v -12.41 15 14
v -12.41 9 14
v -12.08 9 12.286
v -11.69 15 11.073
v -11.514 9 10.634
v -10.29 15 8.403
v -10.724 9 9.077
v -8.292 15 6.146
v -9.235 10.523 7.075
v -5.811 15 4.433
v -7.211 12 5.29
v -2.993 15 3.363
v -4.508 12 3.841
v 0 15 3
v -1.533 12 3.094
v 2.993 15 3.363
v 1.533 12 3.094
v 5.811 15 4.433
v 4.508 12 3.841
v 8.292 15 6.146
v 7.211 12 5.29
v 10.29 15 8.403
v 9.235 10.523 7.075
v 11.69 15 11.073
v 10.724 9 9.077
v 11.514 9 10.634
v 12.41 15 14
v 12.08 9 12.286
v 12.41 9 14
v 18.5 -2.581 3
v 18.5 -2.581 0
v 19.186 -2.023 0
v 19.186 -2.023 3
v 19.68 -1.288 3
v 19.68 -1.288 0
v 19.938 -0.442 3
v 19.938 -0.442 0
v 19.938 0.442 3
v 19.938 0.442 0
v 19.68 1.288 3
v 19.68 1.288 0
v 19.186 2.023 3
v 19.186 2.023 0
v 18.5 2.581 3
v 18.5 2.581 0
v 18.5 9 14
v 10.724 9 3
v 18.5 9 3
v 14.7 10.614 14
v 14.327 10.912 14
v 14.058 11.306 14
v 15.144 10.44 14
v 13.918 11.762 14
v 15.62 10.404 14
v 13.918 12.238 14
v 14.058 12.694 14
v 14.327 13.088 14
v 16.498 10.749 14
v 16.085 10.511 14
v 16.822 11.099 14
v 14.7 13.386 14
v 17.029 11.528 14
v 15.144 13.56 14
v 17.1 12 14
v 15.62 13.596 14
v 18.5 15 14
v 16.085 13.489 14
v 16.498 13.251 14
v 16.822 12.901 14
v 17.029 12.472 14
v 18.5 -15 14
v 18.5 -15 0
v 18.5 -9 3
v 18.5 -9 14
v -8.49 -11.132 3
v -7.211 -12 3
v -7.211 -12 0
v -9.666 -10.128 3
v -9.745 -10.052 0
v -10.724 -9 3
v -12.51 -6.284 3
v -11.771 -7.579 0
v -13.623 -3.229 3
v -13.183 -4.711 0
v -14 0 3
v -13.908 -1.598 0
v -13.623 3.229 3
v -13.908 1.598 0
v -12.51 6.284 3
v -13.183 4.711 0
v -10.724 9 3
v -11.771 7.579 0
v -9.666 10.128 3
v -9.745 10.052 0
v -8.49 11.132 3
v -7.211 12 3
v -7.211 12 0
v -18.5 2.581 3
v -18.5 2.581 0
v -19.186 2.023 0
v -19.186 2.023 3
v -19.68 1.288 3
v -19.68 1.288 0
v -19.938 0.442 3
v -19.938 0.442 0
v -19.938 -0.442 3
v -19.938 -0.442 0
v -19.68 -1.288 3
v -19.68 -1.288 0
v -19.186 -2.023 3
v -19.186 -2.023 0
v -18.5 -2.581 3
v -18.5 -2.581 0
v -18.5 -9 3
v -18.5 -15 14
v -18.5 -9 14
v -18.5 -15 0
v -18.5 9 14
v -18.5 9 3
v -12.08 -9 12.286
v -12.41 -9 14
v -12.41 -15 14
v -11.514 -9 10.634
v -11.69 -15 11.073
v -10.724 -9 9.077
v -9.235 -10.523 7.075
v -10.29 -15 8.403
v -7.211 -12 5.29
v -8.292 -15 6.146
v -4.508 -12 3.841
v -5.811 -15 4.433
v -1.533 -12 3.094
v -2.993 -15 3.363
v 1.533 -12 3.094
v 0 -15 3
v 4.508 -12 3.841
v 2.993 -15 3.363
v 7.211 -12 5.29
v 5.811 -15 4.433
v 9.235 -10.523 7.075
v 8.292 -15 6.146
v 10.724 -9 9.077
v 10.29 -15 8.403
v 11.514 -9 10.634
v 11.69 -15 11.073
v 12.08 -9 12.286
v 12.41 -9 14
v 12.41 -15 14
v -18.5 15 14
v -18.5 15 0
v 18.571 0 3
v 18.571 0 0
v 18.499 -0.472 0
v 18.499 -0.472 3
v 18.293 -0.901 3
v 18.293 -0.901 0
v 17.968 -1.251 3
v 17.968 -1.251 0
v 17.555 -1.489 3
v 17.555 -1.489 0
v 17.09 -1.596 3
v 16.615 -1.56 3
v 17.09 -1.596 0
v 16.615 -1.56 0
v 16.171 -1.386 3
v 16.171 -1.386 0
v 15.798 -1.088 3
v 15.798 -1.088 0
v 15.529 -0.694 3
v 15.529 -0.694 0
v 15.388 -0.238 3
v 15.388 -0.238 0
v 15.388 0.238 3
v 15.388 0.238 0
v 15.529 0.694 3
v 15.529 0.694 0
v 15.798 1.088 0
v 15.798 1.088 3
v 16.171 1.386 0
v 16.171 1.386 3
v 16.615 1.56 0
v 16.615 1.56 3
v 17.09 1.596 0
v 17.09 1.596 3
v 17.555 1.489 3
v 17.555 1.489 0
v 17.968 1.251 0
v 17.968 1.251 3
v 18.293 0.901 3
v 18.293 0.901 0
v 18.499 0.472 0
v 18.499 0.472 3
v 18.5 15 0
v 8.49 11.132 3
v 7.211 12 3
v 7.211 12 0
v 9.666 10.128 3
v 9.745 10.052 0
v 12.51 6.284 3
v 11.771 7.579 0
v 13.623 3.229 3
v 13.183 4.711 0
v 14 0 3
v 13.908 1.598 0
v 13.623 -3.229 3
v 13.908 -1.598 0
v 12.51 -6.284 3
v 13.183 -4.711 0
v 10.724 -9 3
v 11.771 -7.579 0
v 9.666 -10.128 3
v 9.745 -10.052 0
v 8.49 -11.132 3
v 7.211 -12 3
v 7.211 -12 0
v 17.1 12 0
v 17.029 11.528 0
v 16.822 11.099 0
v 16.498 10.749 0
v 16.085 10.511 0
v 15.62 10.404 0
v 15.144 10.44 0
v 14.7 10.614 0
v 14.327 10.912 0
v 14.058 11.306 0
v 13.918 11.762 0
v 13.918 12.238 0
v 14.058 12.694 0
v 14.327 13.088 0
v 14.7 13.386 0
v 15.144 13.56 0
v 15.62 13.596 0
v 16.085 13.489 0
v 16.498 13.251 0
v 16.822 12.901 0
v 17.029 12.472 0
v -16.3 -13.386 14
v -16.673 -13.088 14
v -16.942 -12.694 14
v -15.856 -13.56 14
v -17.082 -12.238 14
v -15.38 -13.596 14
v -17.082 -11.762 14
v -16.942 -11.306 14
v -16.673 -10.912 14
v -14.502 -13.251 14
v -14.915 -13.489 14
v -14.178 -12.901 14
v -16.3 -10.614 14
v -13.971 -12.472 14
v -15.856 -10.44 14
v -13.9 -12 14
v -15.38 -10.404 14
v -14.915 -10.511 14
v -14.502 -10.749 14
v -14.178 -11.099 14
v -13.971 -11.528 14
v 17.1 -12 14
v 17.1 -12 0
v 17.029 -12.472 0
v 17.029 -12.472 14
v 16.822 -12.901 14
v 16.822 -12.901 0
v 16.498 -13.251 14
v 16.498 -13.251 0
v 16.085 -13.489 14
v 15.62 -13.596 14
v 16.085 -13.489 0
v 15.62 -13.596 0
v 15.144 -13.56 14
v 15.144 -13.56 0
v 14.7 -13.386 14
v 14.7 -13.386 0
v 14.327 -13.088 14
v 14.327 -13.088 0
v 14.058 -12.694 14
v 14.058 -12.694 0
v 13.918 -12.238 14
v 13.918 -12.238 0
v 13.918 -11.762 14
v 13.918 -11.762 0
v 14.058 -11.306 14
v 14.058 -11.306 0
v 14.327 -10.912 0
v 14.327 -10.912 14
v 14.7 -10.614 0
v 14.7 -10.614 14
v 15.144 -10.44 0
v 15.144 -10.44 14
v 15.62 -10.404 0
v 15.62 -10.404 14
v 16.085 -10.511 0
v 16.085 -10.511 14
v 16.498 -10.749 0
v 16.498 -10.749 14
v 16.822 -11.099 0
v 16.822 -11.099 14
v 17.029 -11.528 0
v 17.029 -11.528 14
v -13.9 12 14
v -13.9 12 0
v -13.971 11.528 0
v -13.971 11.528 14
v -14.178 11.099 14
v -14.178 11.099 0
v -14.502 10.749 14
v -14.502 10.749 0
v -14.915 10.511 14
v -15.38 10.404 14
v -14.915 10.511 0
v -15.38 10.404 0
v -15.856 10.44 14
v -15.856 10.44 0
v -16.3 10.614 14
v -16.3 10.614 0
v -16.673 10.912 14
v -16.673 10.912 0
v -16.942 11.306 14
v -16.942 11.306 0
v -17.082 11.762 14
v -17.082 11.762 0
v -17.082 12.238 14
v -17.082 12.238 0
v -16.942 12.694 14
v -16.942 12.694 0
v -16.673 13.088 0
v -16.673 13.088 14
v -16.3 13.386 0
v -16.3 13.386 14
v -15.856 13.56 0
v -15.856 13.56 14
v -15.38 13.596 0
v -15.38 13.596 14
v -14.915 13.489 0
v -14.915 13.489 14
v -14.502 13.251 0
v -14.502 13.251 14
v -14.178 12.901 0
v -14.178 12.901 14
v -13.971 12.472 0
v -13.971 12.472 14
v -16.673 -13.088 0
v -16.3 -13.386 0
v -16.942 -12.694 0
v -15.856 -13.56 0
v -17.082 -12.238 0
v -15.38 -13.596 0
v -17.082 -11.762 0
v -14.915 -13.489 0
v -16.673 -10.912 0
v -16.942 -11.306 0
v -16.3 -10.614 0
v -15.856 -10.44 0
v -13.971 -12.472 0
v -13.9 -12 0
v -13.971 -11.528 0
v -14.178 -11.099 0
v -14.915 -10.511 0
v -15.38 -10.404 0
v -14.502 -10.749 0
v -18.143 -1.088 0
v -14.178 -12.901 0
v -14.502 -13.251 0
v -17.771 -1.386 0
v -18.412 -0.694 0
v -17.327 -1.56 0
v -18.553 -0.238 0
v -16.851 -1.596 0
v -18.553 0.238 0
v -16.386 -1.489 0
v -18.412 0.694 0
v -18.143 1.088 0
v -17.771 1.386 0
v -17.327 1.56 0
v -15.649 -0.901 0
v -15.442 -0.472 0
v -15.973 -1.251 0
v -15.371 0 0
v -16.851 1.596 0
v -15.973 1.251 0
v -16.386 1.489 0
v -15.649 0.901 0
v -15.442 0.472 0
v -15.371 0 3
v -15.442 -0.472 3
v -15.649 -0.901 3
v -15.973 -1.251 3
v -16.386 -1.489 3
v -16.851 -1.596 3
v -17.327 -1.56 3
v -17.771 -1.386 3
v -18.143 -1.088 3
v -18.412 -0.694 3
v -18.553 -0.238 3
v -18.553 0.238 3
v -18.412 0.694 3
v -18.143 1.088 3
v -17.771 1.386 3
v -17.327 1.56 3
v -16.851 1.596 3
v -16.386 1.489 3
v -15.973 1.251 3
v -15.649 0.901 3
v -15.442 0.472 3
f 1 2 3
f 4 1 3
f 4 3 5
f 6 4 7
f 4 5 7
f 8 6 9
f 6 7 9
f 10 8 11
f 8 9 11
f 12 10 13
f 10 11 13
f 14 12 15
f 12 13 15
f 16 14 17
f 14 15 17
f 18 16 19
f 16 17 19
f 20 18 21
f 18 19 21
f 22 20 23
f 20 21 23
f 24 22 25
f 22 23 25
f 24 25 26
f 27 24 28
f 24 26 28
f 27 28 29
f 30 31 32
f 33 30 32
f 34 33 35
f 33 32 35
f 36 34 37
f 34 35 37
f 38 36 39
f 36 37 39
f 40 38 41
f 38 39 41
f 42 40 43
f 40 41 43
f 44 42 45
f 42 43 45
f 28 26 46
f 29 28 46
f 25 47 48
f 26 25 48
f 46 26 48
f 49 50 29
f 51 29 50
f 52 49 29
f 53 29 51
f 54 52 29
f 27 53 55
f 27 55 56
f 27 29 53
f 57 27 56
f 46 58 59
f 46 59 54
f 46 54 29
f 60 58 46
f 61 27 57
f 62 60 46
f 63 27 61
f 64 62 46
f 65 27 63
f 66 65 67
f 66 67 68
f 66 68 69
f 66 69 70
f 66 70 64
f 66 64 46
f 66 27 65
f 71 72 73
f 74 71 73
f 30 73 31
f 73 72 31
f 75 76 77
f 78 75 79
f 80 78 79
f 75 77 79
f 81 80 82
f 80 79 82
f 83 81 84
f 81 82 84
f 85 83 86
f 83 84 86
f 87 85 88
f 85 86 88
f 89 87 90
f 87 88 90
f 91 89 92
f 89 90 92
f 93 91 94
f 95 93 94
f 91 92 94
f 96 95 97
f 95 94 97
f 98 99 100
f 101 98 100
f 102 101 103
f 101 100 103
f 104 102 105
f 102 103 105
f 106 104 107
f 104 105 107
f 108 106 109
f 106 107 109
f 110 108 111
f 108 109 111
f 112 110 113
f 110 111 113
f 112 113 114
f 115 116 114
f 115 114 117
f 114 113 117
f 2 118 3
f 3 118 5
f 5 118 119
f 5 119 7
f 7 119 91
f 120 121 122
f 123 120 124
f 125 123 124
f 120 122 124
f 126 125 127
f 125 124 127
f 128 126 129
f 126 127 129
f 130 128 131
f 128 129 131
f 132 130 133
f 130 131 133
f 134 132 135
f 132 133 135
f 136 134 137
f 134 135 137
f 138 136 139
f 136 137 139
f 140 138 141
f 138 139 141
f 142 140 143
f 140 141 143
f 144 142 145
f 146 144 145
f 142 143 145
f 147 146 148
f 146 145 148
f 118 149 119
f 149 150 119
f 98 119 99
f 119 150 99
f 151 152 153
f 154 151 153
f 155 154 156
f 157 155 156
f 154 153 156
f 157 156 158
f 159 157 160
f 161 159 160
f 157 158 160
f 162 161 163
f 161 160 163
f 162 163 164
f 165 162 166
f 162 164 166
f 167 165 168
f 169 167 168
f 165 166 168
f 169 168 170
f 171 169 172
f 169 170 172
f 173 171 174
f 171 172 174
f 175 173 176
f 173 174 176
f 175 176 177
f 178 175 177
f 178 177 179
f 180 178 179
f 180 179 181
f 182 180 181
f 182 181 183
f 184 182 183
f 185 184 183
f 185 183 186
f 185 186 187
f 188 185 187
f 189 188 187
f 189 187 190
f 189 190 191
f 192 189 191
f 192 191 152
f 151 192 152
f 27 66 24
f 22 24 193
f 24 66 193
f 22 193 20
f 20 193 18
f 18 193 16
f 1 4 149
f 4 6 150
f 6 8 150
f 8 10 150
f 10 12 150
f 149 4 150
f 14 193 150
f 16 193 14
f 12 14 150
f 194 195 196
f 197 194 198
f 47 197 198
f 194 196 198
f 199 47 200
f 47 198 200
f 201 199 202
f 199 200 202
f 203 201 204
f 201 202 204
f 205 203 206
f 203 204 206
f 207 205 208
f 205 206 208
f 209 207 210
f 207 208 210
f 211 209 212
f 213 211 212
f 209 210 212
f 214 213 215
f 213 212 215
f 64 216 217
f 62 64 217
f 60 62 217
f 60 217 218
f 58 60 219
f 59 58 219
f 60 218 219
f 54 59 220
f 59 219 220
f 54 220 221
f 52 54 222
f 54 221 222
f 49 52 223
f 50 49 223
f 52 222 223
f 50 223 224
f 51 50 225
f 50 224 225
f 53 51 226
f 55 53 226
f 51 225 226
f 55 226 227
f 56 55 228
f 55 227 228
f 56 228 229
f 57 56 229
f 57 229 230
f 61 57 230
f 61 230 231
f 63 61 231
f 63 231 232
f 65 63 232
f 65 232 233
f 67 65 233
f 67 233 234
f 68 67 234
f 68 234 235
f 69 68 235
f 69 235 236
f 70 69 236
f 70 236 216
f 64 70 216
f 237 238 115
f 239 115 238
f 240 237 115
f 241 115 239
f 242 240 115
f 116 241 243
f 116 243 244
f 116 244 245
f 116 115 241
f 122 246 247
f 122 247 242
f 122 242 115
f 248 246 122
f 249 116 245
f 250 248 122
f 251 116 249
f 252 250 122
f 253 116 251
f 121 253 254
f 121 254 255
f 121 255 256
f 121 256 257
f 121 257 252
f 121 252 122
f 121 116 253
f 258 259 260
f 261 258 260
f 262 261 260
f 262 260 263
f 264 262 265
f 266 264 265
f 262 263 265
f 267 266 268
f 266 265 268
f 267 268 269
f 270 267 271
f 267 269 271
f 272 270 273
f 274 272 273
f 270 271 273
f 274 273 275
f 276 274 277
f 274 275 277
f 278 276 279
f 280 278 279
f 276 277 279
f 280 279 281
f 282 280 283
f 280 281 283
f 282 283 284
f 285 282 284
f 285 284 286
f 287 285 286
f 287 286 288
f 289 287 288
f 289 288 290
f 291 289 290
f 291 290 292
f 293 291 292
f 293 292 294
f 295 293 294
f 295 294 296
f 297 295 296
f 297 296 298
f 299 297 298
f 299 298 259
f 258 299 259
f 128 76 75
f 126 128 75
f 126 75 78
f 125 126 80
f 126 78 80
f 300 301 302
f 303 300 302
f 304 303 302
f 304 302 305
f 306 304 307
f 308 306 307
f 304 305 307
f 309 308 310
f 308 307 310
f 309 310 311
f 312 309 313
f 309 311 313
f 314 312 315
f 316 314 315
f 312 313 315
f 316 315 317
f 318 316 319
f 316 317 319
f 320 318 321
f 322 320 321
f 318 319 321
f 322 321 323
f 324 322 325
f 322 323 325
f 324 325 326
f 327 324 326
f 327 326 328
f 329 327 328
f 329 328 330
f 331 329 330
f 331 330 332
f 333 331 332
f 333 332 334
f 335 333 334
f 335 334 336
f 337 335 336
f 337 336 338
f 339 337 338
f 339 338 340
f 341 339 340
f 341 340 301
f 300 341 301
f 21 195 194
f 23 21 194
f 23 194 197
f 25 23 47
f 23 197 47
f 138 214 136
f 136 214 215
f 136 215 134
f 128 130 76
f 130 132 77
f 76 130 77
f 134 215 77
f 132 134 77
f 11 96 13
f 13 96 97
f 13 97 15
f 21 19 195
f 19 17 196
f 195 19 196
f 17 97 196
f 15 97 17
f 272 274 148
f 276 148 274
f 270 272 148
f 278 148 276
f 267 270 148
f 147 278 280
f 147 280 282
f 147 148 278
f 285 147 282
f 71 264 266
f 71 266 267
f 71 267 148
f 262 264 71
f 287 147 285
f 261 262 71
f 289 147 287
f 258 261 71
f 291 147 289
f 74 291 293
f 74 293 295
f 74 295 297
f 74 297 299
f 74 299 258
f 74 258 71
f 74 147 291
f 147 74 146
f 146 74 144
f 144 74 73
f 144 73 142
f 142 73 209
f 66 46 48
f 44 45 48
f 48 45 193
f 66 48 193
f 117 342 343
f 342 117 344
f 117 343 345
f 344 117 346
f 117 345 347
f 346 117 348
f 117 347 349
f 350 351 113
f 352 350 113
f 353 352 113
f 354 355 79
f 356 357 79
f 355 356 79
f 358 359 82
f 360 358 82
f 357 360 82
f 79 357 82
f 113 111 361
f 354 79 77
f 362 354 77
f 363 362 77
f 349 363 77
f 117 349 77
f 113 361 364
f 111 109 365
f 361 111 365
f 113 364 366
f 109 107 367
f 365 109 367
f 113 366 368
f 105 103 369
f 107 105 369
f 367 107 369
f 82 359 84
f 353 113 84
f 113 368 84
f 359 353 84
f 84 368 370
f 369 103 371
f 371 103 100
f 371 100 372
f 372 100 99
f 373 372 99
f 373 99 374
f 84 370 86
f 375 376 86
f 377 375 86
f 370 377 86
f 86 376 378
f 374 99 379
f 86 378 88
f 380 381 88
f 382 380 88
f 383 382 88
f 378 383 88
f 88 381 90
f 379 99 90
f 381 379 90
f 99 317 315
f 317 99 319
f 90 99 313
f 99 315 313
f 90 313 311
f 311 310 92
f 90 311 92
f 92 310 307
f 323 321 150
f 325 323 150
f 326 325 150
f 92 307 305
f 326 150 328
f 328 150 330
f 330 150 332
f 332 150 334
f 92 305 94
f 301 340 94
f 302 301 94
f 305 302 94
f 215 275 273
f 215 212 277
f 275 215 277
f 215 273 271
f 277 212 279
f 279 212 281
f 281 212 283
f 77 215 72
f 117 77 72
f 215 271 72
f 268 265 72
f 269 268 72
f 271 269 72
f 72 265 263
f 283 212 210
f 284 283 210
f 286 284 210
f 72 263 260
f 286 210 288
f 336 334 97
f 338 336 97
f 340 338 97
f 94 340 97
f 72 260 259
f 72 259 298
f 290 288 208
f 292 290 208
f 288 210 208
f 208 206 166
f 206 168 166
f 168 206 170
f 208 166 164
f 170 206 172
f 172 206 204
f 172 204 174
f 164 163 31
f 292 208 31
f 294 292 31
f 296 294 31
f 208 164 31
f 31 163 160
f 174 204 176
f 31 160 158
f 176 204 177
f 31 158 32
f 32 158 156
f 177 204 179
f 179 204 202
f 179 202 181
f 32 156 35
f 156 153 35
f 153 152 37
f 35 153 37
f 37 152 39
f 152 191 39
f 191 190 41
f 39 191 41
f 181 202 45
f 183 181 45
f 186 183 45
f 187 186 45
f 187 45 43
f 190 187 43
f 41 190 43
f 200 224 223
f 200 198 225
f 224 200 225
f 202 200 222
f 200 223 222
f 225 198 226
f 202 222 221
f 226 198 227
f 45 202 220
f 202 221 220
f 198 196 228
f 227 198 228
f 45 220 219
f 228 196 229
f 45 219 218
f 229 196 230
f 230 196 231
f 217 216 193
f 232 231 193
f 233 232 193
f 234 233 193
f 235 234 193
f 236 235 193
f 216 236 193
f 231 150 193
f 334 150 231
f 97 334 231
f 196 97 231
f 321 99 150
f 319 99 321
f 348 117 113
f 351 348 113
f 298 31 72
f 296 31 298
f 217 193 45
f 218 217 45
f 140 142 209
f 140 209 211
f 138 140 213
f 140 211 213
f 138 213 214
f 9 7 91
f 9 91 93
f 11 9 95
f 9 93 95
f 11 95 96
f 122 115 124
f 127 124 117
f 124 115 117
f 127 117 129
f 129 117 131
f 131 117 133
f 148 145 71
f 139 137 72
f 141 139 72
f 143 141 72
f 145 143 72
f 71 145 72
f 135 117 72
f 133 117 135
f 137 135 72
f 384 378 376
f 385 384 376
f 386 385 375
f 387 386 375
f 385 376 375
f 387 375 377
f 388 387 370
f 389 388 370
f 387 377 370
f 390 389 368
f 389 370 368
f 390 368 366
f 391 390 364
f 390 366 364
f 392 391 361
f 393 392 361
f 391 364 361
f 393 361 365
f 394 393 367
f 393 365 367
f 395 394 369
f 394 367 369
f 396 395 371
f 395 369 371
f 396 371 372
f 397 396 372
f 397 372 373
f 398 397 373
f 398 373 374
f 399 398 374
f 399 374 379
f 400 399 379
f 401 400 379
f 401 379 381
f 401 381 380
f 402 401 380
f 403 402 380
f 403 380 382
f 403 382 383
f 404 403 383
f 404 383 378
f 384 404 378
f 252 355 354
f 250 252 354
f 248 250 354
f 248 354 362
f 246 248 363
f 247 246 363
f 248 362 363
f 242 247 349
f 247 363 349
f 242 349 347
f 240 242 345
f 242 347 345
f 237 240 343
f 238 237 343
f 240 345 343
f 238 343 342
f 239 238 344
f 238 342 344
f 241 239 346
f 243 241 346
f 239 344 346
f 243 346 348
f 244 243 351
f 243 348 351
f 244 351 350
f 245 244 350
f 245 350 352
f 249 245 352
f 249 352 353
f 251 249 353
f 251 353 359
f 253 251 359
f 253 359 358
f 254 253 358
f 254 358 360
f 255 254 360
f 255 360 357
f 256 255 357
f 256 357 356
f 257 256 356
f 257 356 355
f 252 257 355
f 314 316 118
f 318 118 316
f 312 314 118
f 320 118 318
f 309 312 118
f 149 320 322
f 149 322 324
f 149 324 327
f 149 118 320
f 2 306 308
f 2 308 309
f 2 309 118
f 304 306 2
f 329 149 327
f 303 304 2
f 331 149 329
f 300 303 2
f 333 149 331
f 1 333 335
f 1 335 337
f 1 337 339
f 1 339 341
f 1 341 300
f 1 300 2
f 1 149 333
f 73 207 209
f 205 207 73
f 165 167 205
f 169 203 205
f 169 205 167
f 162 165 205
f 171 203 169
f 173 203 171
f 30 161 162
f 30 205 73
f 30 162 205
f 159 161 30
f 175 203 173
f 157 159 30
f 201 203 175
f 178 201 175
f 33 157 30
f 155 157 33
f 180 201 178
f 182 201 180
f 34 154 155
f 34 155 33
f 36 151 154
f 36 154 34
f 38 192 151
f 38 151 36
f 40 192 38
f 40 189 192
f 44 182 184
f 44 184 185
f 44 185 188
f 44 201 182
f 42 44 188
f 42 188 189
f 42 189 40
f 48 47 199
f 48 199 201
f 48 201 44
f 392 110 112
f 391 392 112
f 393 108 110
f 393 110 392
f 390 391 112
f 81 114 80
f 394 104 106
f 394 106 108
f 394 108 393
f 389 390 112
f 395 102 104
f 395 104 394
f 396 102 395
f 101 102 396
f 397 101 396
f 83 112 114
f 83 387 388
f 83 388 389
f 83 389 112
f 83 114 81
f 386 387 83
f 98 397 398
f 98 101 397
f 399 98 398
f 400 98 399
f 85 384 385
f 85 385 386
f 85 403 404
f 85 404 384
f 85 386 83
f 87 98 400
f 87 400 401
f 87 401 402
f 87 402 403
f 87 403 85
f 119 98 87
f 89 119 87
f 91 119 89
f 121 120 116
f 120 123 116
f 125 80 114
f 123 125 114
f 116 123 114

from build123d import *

# Parameters (mm, degrees)
F1_DEPTH = 3
F3_DEPTH = 11
F5_DEPTH = 30.001
F6_R     = 1.6
F7_DEPTH = 14.001


with BuildPart() as f1:
    # F0 (on Top) → F1 (new body)
    with BuildSketch(Plane.XY):
        with BuildLine():
            Line((18.5, 15), (-18.5, 15))
            Line((-18.5, 15), (-18.5, 2.580857))
            ThreePointArc((-18.5, 2.580857), (-19.970563, 0), (-18.5, -2.580857))
            Line((-18.5, -2.580857), (-18.5, -15))
            Line((-18.5, -15), (18.5, -15))
            Line((18.5, -15), (18.5, -2.580857))
            ThreePointArc((18.5, -2.580857), (19.970563, 0), (18.5, 2.580857))
            Line((18.5, 2.580857), (18.5, 15))
        make_face()
        with BuildLine():
            Line((-7.211103, 12), (7.211103, 12))
            ThreePointArc((7.211103, 12), (14, 0), (7.211103, -12))
            Line((7.211103, -12), (-7.211103, -12))
            ThreePointArc((-7.211103, -12), (-14, 0), (-7.211103, 12))
        make_face(mode=Mode.SUBTRACT)
    extrude(amount=F1_DEPTH)

    # F2 (on face) → F3 (join)
    with BuildSketch(Plane.XY.offset(3)):
        with BuildLine():
            Line((18.5, 15), (-18.5, 15))
            Line((-18.5, 15), (-18.5, 9))
            Line((-18.5, 9), (-10.723805, 9))
            ThreePointArc((-10.723805, 9), (-9.092042, 10.64588), (-7.211103, 12))
            Line((-7.211103, 12), (7.211103, 12))
            ThreePointArc((7.211103, 12), (9.092042, 10.64588), (10.723805, 9))
            Line((10.723805, 9), (18.5, 9))
            Line((18.5, 9), (18.5, 15))
        make_face()
        with BuildLine():
            ThreePointArc((10.723805, -9), (9.092042, -10.64588), (7.211103, -12))
            Line((7.211103, -12), (-7.211103, -12))
            ThreePointArc((-7.211103, -12), (-9.092042, -10.64588), (-10.723805, -9))
            Line((-10.723805, -9), (-18.5, -9))
            Line((-18.5, -9), (-18.5, -15))
            Line((-18.5, -15), (18.5, -15))
            Line((18.5, -15), (18.5, -9))
            Line((18.5, -9), (10.723805, -9))
        make_face()
    extrude(amount=F3_DEPTH)

    # F4 (on face) → F5 (cut, through all)
    with BuildSketch(Plane.XZ.offset(15)):
        with BuildLine():
            Line((12.409674, 14), (-12.409674, 14))
            ThreePointArc((-12.409674, 14), (0, 3), (12.409674, 14))
        make_face()
    extrude(amount=-F5_DEPTH, mode=Mode.SUBTRACT)

    # F6 (on face) → F7 (cut, through all)
    with BuildSketch(Plane(origin=(0, 0, 0), x_dir=(1, 0, 0), z_dir=(0, 0, -1))):
        with Locations((-15.5, 12)):
            Circle(F6_R)
        with Locations((15.5, 12)):
            Circle(F6_R)
        with Locations((15.5, -12)):
            Circle(F6_R)
        with Locations((-15.5, -12)):
            Circle(F6_R)
        with Locations((-16.970563, 0)):
            Circle(F6_R)
        with Locations((16.970563, 0)):
            Circle(F6_R)
    extrude(amount=-F7_DEPTH, mode=Mode.SUBTRACT)


solid = f1.part
